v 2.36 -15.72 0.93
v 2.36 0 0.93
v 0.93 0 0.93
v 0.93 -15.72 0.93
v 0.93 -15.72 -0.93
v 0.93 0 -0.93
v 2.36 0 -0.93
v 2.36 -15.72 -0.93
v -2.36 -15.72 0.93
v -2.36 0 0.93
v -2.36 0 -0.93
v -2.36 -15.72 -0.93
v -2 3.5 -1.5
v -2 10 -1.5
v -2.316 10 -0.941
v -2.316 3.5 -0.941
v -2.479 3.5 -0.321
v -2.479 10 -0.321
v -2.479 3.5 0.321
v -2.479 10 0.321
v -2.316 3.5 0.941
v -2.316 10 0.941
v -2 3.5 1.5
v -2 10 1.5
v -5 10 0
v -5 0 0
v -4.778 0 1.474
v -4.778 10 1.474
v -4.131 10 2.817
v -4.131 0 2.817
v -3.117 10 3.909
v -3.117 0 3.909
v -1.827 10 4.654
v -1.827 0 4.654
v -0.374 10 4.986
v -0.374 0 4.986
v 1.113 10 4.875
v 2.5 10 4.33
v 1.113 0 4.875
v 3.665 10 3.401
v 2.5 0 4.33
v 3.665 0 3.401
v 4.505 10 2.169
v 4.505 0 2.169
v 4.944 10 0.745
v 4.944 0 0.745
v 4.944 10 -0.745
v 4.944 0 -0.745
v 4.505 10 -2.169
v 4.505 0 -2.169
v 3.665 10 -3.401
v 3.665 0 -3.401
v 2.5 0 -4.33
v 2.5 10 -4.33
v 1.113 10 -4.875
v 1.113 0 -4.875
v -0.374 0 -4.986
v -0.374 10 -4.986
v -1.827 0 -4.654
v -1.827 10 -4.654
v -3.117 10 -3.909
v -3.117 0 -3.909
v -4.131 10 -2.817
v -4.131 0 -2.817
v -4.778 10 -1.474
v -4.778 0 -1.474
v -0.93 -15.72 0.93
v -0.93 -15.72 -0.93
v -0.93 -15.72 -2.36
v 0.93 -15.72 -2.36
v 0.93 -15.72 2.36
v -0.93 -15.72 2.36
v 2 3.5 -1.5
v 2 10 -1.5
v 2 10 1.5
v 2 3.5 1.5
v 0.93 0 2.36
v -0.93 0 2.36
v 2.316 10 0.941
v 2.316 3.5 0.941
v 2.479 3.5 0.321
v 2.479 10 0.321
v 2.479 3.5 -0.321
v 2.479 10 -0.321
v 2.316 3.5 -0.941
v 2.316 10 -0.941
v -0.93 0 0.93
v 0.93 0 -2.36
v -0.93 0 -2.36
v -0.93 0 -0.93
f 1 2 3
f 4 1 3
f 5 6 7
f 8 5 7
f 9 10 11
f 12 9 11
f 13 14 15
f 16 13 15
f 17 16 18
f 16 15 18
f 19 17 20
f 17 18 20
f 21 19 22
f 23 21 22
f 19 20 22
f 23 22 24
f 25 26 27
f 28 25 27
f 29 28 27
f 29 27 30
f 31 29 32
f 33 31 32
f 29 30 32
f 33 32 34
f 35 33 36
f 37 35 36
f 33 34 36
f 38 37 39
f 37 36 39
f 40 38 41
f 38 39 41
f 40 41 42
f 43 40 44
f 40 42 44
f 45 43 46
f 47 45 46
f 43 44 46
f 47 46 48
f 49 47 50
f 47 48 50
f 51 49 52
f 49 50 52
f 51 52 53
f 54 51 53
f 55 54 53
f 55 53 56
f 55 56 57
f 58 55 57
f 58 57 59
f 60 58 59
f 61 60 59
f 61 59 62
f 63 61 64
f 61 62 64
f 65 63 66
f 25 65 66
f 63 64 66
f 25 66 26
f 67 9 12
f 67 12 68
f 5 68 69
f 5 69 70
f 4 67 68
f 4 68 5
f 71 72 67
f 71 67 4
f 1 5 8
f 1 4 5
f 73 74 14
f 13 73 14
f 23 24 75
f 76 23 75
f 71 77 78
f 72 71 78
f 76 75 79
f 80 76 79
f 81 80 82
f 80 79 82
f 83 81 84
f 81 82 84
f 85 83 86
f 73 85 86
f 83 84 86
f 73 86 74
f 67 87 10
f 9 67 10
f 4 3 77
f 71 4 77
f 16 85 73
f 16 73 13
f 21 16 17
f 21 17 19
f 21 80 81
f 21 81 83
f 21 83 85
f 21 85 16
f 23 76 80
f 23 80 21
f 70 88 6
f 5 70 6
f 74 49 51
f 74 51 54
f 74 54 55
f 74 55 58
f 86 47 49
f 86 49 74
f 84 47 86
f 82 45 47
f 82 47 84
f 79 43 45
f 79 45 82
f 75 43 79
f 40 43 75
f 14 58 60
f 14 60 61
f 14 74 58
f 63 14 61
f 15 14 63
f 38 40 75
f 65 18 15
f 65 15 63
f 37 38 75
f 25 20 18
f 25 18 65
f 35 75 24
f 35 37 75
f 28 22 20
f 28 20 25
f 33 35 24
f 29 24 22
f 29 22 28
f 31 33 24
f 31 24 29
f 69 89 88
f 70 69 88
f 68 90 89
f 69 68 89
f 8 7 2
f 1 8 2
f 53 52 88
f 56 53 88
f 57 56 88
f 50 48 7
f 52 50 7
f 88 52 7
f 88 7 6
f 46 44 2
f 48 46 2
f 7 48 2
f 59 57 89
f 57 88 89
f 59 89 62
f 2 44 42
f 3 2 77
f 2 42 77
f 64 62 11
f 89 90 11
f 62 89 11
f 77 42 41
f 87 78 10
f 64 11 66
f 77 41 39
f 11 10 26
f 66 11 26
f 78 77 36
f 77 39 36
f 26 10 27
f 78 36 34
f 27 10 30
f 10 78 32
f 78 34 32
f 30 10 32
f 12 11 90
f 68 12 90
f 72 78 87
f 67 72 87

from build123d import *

# Parameters (mm, degrees)
F1_DEPTH = 15.72
F2_R     = 5
F3_DEPTH = 10
F5_DEPTH = 6.5


with BuildPart() as f1:
    # F0 (on Front) → F1 (new body)
    with BuildSketch(Plane.XZ):
        Polygon((0.93, 0.93), (0.93, 2.36), (-0.93, 2.36), (-0.93, 0.93), (-2.36, 0.93), (-2.36, -0.93), (-0.93, -0.93), (-0.93, -2.36), (0.93, -2.36), (0.93, -0.93), (2.36, -0.93), (2.36, 0.93), align=None)
    extrude(amount=F1_DEPTH)

    # F2 (on face) → F3 (join)
    with BuildSketch(Plane(origin=(0, 0, 0), x_dir=(-1, 0, 0), z_dir=(0, 1, 0))):
        Circle(F2_R)
    extrude(amount=F3_DEPTH)

    # F4 (on face) → F5 (cut)
    with BuildSketch(Plane(origin=(0, 10, 0), x_dir=(-1, 0, 0), z_dir=(0, 1, 0))):
        with BuildLine():
            ThreePointArc((2, -1.5), (2.5, 0), (2, 1.5))
            Line((2, 1.5), (-2, 1.5))
            ThreePointArc((-2, 1.5), (-2.5, 0), (-2, -1.5))
            Line((-2, -1.5), (2, -1.5))
        make_face()
    extrude(amount=-F5_DEPTH, mode=Mode.SUBTRACT)


solid = f1.part
